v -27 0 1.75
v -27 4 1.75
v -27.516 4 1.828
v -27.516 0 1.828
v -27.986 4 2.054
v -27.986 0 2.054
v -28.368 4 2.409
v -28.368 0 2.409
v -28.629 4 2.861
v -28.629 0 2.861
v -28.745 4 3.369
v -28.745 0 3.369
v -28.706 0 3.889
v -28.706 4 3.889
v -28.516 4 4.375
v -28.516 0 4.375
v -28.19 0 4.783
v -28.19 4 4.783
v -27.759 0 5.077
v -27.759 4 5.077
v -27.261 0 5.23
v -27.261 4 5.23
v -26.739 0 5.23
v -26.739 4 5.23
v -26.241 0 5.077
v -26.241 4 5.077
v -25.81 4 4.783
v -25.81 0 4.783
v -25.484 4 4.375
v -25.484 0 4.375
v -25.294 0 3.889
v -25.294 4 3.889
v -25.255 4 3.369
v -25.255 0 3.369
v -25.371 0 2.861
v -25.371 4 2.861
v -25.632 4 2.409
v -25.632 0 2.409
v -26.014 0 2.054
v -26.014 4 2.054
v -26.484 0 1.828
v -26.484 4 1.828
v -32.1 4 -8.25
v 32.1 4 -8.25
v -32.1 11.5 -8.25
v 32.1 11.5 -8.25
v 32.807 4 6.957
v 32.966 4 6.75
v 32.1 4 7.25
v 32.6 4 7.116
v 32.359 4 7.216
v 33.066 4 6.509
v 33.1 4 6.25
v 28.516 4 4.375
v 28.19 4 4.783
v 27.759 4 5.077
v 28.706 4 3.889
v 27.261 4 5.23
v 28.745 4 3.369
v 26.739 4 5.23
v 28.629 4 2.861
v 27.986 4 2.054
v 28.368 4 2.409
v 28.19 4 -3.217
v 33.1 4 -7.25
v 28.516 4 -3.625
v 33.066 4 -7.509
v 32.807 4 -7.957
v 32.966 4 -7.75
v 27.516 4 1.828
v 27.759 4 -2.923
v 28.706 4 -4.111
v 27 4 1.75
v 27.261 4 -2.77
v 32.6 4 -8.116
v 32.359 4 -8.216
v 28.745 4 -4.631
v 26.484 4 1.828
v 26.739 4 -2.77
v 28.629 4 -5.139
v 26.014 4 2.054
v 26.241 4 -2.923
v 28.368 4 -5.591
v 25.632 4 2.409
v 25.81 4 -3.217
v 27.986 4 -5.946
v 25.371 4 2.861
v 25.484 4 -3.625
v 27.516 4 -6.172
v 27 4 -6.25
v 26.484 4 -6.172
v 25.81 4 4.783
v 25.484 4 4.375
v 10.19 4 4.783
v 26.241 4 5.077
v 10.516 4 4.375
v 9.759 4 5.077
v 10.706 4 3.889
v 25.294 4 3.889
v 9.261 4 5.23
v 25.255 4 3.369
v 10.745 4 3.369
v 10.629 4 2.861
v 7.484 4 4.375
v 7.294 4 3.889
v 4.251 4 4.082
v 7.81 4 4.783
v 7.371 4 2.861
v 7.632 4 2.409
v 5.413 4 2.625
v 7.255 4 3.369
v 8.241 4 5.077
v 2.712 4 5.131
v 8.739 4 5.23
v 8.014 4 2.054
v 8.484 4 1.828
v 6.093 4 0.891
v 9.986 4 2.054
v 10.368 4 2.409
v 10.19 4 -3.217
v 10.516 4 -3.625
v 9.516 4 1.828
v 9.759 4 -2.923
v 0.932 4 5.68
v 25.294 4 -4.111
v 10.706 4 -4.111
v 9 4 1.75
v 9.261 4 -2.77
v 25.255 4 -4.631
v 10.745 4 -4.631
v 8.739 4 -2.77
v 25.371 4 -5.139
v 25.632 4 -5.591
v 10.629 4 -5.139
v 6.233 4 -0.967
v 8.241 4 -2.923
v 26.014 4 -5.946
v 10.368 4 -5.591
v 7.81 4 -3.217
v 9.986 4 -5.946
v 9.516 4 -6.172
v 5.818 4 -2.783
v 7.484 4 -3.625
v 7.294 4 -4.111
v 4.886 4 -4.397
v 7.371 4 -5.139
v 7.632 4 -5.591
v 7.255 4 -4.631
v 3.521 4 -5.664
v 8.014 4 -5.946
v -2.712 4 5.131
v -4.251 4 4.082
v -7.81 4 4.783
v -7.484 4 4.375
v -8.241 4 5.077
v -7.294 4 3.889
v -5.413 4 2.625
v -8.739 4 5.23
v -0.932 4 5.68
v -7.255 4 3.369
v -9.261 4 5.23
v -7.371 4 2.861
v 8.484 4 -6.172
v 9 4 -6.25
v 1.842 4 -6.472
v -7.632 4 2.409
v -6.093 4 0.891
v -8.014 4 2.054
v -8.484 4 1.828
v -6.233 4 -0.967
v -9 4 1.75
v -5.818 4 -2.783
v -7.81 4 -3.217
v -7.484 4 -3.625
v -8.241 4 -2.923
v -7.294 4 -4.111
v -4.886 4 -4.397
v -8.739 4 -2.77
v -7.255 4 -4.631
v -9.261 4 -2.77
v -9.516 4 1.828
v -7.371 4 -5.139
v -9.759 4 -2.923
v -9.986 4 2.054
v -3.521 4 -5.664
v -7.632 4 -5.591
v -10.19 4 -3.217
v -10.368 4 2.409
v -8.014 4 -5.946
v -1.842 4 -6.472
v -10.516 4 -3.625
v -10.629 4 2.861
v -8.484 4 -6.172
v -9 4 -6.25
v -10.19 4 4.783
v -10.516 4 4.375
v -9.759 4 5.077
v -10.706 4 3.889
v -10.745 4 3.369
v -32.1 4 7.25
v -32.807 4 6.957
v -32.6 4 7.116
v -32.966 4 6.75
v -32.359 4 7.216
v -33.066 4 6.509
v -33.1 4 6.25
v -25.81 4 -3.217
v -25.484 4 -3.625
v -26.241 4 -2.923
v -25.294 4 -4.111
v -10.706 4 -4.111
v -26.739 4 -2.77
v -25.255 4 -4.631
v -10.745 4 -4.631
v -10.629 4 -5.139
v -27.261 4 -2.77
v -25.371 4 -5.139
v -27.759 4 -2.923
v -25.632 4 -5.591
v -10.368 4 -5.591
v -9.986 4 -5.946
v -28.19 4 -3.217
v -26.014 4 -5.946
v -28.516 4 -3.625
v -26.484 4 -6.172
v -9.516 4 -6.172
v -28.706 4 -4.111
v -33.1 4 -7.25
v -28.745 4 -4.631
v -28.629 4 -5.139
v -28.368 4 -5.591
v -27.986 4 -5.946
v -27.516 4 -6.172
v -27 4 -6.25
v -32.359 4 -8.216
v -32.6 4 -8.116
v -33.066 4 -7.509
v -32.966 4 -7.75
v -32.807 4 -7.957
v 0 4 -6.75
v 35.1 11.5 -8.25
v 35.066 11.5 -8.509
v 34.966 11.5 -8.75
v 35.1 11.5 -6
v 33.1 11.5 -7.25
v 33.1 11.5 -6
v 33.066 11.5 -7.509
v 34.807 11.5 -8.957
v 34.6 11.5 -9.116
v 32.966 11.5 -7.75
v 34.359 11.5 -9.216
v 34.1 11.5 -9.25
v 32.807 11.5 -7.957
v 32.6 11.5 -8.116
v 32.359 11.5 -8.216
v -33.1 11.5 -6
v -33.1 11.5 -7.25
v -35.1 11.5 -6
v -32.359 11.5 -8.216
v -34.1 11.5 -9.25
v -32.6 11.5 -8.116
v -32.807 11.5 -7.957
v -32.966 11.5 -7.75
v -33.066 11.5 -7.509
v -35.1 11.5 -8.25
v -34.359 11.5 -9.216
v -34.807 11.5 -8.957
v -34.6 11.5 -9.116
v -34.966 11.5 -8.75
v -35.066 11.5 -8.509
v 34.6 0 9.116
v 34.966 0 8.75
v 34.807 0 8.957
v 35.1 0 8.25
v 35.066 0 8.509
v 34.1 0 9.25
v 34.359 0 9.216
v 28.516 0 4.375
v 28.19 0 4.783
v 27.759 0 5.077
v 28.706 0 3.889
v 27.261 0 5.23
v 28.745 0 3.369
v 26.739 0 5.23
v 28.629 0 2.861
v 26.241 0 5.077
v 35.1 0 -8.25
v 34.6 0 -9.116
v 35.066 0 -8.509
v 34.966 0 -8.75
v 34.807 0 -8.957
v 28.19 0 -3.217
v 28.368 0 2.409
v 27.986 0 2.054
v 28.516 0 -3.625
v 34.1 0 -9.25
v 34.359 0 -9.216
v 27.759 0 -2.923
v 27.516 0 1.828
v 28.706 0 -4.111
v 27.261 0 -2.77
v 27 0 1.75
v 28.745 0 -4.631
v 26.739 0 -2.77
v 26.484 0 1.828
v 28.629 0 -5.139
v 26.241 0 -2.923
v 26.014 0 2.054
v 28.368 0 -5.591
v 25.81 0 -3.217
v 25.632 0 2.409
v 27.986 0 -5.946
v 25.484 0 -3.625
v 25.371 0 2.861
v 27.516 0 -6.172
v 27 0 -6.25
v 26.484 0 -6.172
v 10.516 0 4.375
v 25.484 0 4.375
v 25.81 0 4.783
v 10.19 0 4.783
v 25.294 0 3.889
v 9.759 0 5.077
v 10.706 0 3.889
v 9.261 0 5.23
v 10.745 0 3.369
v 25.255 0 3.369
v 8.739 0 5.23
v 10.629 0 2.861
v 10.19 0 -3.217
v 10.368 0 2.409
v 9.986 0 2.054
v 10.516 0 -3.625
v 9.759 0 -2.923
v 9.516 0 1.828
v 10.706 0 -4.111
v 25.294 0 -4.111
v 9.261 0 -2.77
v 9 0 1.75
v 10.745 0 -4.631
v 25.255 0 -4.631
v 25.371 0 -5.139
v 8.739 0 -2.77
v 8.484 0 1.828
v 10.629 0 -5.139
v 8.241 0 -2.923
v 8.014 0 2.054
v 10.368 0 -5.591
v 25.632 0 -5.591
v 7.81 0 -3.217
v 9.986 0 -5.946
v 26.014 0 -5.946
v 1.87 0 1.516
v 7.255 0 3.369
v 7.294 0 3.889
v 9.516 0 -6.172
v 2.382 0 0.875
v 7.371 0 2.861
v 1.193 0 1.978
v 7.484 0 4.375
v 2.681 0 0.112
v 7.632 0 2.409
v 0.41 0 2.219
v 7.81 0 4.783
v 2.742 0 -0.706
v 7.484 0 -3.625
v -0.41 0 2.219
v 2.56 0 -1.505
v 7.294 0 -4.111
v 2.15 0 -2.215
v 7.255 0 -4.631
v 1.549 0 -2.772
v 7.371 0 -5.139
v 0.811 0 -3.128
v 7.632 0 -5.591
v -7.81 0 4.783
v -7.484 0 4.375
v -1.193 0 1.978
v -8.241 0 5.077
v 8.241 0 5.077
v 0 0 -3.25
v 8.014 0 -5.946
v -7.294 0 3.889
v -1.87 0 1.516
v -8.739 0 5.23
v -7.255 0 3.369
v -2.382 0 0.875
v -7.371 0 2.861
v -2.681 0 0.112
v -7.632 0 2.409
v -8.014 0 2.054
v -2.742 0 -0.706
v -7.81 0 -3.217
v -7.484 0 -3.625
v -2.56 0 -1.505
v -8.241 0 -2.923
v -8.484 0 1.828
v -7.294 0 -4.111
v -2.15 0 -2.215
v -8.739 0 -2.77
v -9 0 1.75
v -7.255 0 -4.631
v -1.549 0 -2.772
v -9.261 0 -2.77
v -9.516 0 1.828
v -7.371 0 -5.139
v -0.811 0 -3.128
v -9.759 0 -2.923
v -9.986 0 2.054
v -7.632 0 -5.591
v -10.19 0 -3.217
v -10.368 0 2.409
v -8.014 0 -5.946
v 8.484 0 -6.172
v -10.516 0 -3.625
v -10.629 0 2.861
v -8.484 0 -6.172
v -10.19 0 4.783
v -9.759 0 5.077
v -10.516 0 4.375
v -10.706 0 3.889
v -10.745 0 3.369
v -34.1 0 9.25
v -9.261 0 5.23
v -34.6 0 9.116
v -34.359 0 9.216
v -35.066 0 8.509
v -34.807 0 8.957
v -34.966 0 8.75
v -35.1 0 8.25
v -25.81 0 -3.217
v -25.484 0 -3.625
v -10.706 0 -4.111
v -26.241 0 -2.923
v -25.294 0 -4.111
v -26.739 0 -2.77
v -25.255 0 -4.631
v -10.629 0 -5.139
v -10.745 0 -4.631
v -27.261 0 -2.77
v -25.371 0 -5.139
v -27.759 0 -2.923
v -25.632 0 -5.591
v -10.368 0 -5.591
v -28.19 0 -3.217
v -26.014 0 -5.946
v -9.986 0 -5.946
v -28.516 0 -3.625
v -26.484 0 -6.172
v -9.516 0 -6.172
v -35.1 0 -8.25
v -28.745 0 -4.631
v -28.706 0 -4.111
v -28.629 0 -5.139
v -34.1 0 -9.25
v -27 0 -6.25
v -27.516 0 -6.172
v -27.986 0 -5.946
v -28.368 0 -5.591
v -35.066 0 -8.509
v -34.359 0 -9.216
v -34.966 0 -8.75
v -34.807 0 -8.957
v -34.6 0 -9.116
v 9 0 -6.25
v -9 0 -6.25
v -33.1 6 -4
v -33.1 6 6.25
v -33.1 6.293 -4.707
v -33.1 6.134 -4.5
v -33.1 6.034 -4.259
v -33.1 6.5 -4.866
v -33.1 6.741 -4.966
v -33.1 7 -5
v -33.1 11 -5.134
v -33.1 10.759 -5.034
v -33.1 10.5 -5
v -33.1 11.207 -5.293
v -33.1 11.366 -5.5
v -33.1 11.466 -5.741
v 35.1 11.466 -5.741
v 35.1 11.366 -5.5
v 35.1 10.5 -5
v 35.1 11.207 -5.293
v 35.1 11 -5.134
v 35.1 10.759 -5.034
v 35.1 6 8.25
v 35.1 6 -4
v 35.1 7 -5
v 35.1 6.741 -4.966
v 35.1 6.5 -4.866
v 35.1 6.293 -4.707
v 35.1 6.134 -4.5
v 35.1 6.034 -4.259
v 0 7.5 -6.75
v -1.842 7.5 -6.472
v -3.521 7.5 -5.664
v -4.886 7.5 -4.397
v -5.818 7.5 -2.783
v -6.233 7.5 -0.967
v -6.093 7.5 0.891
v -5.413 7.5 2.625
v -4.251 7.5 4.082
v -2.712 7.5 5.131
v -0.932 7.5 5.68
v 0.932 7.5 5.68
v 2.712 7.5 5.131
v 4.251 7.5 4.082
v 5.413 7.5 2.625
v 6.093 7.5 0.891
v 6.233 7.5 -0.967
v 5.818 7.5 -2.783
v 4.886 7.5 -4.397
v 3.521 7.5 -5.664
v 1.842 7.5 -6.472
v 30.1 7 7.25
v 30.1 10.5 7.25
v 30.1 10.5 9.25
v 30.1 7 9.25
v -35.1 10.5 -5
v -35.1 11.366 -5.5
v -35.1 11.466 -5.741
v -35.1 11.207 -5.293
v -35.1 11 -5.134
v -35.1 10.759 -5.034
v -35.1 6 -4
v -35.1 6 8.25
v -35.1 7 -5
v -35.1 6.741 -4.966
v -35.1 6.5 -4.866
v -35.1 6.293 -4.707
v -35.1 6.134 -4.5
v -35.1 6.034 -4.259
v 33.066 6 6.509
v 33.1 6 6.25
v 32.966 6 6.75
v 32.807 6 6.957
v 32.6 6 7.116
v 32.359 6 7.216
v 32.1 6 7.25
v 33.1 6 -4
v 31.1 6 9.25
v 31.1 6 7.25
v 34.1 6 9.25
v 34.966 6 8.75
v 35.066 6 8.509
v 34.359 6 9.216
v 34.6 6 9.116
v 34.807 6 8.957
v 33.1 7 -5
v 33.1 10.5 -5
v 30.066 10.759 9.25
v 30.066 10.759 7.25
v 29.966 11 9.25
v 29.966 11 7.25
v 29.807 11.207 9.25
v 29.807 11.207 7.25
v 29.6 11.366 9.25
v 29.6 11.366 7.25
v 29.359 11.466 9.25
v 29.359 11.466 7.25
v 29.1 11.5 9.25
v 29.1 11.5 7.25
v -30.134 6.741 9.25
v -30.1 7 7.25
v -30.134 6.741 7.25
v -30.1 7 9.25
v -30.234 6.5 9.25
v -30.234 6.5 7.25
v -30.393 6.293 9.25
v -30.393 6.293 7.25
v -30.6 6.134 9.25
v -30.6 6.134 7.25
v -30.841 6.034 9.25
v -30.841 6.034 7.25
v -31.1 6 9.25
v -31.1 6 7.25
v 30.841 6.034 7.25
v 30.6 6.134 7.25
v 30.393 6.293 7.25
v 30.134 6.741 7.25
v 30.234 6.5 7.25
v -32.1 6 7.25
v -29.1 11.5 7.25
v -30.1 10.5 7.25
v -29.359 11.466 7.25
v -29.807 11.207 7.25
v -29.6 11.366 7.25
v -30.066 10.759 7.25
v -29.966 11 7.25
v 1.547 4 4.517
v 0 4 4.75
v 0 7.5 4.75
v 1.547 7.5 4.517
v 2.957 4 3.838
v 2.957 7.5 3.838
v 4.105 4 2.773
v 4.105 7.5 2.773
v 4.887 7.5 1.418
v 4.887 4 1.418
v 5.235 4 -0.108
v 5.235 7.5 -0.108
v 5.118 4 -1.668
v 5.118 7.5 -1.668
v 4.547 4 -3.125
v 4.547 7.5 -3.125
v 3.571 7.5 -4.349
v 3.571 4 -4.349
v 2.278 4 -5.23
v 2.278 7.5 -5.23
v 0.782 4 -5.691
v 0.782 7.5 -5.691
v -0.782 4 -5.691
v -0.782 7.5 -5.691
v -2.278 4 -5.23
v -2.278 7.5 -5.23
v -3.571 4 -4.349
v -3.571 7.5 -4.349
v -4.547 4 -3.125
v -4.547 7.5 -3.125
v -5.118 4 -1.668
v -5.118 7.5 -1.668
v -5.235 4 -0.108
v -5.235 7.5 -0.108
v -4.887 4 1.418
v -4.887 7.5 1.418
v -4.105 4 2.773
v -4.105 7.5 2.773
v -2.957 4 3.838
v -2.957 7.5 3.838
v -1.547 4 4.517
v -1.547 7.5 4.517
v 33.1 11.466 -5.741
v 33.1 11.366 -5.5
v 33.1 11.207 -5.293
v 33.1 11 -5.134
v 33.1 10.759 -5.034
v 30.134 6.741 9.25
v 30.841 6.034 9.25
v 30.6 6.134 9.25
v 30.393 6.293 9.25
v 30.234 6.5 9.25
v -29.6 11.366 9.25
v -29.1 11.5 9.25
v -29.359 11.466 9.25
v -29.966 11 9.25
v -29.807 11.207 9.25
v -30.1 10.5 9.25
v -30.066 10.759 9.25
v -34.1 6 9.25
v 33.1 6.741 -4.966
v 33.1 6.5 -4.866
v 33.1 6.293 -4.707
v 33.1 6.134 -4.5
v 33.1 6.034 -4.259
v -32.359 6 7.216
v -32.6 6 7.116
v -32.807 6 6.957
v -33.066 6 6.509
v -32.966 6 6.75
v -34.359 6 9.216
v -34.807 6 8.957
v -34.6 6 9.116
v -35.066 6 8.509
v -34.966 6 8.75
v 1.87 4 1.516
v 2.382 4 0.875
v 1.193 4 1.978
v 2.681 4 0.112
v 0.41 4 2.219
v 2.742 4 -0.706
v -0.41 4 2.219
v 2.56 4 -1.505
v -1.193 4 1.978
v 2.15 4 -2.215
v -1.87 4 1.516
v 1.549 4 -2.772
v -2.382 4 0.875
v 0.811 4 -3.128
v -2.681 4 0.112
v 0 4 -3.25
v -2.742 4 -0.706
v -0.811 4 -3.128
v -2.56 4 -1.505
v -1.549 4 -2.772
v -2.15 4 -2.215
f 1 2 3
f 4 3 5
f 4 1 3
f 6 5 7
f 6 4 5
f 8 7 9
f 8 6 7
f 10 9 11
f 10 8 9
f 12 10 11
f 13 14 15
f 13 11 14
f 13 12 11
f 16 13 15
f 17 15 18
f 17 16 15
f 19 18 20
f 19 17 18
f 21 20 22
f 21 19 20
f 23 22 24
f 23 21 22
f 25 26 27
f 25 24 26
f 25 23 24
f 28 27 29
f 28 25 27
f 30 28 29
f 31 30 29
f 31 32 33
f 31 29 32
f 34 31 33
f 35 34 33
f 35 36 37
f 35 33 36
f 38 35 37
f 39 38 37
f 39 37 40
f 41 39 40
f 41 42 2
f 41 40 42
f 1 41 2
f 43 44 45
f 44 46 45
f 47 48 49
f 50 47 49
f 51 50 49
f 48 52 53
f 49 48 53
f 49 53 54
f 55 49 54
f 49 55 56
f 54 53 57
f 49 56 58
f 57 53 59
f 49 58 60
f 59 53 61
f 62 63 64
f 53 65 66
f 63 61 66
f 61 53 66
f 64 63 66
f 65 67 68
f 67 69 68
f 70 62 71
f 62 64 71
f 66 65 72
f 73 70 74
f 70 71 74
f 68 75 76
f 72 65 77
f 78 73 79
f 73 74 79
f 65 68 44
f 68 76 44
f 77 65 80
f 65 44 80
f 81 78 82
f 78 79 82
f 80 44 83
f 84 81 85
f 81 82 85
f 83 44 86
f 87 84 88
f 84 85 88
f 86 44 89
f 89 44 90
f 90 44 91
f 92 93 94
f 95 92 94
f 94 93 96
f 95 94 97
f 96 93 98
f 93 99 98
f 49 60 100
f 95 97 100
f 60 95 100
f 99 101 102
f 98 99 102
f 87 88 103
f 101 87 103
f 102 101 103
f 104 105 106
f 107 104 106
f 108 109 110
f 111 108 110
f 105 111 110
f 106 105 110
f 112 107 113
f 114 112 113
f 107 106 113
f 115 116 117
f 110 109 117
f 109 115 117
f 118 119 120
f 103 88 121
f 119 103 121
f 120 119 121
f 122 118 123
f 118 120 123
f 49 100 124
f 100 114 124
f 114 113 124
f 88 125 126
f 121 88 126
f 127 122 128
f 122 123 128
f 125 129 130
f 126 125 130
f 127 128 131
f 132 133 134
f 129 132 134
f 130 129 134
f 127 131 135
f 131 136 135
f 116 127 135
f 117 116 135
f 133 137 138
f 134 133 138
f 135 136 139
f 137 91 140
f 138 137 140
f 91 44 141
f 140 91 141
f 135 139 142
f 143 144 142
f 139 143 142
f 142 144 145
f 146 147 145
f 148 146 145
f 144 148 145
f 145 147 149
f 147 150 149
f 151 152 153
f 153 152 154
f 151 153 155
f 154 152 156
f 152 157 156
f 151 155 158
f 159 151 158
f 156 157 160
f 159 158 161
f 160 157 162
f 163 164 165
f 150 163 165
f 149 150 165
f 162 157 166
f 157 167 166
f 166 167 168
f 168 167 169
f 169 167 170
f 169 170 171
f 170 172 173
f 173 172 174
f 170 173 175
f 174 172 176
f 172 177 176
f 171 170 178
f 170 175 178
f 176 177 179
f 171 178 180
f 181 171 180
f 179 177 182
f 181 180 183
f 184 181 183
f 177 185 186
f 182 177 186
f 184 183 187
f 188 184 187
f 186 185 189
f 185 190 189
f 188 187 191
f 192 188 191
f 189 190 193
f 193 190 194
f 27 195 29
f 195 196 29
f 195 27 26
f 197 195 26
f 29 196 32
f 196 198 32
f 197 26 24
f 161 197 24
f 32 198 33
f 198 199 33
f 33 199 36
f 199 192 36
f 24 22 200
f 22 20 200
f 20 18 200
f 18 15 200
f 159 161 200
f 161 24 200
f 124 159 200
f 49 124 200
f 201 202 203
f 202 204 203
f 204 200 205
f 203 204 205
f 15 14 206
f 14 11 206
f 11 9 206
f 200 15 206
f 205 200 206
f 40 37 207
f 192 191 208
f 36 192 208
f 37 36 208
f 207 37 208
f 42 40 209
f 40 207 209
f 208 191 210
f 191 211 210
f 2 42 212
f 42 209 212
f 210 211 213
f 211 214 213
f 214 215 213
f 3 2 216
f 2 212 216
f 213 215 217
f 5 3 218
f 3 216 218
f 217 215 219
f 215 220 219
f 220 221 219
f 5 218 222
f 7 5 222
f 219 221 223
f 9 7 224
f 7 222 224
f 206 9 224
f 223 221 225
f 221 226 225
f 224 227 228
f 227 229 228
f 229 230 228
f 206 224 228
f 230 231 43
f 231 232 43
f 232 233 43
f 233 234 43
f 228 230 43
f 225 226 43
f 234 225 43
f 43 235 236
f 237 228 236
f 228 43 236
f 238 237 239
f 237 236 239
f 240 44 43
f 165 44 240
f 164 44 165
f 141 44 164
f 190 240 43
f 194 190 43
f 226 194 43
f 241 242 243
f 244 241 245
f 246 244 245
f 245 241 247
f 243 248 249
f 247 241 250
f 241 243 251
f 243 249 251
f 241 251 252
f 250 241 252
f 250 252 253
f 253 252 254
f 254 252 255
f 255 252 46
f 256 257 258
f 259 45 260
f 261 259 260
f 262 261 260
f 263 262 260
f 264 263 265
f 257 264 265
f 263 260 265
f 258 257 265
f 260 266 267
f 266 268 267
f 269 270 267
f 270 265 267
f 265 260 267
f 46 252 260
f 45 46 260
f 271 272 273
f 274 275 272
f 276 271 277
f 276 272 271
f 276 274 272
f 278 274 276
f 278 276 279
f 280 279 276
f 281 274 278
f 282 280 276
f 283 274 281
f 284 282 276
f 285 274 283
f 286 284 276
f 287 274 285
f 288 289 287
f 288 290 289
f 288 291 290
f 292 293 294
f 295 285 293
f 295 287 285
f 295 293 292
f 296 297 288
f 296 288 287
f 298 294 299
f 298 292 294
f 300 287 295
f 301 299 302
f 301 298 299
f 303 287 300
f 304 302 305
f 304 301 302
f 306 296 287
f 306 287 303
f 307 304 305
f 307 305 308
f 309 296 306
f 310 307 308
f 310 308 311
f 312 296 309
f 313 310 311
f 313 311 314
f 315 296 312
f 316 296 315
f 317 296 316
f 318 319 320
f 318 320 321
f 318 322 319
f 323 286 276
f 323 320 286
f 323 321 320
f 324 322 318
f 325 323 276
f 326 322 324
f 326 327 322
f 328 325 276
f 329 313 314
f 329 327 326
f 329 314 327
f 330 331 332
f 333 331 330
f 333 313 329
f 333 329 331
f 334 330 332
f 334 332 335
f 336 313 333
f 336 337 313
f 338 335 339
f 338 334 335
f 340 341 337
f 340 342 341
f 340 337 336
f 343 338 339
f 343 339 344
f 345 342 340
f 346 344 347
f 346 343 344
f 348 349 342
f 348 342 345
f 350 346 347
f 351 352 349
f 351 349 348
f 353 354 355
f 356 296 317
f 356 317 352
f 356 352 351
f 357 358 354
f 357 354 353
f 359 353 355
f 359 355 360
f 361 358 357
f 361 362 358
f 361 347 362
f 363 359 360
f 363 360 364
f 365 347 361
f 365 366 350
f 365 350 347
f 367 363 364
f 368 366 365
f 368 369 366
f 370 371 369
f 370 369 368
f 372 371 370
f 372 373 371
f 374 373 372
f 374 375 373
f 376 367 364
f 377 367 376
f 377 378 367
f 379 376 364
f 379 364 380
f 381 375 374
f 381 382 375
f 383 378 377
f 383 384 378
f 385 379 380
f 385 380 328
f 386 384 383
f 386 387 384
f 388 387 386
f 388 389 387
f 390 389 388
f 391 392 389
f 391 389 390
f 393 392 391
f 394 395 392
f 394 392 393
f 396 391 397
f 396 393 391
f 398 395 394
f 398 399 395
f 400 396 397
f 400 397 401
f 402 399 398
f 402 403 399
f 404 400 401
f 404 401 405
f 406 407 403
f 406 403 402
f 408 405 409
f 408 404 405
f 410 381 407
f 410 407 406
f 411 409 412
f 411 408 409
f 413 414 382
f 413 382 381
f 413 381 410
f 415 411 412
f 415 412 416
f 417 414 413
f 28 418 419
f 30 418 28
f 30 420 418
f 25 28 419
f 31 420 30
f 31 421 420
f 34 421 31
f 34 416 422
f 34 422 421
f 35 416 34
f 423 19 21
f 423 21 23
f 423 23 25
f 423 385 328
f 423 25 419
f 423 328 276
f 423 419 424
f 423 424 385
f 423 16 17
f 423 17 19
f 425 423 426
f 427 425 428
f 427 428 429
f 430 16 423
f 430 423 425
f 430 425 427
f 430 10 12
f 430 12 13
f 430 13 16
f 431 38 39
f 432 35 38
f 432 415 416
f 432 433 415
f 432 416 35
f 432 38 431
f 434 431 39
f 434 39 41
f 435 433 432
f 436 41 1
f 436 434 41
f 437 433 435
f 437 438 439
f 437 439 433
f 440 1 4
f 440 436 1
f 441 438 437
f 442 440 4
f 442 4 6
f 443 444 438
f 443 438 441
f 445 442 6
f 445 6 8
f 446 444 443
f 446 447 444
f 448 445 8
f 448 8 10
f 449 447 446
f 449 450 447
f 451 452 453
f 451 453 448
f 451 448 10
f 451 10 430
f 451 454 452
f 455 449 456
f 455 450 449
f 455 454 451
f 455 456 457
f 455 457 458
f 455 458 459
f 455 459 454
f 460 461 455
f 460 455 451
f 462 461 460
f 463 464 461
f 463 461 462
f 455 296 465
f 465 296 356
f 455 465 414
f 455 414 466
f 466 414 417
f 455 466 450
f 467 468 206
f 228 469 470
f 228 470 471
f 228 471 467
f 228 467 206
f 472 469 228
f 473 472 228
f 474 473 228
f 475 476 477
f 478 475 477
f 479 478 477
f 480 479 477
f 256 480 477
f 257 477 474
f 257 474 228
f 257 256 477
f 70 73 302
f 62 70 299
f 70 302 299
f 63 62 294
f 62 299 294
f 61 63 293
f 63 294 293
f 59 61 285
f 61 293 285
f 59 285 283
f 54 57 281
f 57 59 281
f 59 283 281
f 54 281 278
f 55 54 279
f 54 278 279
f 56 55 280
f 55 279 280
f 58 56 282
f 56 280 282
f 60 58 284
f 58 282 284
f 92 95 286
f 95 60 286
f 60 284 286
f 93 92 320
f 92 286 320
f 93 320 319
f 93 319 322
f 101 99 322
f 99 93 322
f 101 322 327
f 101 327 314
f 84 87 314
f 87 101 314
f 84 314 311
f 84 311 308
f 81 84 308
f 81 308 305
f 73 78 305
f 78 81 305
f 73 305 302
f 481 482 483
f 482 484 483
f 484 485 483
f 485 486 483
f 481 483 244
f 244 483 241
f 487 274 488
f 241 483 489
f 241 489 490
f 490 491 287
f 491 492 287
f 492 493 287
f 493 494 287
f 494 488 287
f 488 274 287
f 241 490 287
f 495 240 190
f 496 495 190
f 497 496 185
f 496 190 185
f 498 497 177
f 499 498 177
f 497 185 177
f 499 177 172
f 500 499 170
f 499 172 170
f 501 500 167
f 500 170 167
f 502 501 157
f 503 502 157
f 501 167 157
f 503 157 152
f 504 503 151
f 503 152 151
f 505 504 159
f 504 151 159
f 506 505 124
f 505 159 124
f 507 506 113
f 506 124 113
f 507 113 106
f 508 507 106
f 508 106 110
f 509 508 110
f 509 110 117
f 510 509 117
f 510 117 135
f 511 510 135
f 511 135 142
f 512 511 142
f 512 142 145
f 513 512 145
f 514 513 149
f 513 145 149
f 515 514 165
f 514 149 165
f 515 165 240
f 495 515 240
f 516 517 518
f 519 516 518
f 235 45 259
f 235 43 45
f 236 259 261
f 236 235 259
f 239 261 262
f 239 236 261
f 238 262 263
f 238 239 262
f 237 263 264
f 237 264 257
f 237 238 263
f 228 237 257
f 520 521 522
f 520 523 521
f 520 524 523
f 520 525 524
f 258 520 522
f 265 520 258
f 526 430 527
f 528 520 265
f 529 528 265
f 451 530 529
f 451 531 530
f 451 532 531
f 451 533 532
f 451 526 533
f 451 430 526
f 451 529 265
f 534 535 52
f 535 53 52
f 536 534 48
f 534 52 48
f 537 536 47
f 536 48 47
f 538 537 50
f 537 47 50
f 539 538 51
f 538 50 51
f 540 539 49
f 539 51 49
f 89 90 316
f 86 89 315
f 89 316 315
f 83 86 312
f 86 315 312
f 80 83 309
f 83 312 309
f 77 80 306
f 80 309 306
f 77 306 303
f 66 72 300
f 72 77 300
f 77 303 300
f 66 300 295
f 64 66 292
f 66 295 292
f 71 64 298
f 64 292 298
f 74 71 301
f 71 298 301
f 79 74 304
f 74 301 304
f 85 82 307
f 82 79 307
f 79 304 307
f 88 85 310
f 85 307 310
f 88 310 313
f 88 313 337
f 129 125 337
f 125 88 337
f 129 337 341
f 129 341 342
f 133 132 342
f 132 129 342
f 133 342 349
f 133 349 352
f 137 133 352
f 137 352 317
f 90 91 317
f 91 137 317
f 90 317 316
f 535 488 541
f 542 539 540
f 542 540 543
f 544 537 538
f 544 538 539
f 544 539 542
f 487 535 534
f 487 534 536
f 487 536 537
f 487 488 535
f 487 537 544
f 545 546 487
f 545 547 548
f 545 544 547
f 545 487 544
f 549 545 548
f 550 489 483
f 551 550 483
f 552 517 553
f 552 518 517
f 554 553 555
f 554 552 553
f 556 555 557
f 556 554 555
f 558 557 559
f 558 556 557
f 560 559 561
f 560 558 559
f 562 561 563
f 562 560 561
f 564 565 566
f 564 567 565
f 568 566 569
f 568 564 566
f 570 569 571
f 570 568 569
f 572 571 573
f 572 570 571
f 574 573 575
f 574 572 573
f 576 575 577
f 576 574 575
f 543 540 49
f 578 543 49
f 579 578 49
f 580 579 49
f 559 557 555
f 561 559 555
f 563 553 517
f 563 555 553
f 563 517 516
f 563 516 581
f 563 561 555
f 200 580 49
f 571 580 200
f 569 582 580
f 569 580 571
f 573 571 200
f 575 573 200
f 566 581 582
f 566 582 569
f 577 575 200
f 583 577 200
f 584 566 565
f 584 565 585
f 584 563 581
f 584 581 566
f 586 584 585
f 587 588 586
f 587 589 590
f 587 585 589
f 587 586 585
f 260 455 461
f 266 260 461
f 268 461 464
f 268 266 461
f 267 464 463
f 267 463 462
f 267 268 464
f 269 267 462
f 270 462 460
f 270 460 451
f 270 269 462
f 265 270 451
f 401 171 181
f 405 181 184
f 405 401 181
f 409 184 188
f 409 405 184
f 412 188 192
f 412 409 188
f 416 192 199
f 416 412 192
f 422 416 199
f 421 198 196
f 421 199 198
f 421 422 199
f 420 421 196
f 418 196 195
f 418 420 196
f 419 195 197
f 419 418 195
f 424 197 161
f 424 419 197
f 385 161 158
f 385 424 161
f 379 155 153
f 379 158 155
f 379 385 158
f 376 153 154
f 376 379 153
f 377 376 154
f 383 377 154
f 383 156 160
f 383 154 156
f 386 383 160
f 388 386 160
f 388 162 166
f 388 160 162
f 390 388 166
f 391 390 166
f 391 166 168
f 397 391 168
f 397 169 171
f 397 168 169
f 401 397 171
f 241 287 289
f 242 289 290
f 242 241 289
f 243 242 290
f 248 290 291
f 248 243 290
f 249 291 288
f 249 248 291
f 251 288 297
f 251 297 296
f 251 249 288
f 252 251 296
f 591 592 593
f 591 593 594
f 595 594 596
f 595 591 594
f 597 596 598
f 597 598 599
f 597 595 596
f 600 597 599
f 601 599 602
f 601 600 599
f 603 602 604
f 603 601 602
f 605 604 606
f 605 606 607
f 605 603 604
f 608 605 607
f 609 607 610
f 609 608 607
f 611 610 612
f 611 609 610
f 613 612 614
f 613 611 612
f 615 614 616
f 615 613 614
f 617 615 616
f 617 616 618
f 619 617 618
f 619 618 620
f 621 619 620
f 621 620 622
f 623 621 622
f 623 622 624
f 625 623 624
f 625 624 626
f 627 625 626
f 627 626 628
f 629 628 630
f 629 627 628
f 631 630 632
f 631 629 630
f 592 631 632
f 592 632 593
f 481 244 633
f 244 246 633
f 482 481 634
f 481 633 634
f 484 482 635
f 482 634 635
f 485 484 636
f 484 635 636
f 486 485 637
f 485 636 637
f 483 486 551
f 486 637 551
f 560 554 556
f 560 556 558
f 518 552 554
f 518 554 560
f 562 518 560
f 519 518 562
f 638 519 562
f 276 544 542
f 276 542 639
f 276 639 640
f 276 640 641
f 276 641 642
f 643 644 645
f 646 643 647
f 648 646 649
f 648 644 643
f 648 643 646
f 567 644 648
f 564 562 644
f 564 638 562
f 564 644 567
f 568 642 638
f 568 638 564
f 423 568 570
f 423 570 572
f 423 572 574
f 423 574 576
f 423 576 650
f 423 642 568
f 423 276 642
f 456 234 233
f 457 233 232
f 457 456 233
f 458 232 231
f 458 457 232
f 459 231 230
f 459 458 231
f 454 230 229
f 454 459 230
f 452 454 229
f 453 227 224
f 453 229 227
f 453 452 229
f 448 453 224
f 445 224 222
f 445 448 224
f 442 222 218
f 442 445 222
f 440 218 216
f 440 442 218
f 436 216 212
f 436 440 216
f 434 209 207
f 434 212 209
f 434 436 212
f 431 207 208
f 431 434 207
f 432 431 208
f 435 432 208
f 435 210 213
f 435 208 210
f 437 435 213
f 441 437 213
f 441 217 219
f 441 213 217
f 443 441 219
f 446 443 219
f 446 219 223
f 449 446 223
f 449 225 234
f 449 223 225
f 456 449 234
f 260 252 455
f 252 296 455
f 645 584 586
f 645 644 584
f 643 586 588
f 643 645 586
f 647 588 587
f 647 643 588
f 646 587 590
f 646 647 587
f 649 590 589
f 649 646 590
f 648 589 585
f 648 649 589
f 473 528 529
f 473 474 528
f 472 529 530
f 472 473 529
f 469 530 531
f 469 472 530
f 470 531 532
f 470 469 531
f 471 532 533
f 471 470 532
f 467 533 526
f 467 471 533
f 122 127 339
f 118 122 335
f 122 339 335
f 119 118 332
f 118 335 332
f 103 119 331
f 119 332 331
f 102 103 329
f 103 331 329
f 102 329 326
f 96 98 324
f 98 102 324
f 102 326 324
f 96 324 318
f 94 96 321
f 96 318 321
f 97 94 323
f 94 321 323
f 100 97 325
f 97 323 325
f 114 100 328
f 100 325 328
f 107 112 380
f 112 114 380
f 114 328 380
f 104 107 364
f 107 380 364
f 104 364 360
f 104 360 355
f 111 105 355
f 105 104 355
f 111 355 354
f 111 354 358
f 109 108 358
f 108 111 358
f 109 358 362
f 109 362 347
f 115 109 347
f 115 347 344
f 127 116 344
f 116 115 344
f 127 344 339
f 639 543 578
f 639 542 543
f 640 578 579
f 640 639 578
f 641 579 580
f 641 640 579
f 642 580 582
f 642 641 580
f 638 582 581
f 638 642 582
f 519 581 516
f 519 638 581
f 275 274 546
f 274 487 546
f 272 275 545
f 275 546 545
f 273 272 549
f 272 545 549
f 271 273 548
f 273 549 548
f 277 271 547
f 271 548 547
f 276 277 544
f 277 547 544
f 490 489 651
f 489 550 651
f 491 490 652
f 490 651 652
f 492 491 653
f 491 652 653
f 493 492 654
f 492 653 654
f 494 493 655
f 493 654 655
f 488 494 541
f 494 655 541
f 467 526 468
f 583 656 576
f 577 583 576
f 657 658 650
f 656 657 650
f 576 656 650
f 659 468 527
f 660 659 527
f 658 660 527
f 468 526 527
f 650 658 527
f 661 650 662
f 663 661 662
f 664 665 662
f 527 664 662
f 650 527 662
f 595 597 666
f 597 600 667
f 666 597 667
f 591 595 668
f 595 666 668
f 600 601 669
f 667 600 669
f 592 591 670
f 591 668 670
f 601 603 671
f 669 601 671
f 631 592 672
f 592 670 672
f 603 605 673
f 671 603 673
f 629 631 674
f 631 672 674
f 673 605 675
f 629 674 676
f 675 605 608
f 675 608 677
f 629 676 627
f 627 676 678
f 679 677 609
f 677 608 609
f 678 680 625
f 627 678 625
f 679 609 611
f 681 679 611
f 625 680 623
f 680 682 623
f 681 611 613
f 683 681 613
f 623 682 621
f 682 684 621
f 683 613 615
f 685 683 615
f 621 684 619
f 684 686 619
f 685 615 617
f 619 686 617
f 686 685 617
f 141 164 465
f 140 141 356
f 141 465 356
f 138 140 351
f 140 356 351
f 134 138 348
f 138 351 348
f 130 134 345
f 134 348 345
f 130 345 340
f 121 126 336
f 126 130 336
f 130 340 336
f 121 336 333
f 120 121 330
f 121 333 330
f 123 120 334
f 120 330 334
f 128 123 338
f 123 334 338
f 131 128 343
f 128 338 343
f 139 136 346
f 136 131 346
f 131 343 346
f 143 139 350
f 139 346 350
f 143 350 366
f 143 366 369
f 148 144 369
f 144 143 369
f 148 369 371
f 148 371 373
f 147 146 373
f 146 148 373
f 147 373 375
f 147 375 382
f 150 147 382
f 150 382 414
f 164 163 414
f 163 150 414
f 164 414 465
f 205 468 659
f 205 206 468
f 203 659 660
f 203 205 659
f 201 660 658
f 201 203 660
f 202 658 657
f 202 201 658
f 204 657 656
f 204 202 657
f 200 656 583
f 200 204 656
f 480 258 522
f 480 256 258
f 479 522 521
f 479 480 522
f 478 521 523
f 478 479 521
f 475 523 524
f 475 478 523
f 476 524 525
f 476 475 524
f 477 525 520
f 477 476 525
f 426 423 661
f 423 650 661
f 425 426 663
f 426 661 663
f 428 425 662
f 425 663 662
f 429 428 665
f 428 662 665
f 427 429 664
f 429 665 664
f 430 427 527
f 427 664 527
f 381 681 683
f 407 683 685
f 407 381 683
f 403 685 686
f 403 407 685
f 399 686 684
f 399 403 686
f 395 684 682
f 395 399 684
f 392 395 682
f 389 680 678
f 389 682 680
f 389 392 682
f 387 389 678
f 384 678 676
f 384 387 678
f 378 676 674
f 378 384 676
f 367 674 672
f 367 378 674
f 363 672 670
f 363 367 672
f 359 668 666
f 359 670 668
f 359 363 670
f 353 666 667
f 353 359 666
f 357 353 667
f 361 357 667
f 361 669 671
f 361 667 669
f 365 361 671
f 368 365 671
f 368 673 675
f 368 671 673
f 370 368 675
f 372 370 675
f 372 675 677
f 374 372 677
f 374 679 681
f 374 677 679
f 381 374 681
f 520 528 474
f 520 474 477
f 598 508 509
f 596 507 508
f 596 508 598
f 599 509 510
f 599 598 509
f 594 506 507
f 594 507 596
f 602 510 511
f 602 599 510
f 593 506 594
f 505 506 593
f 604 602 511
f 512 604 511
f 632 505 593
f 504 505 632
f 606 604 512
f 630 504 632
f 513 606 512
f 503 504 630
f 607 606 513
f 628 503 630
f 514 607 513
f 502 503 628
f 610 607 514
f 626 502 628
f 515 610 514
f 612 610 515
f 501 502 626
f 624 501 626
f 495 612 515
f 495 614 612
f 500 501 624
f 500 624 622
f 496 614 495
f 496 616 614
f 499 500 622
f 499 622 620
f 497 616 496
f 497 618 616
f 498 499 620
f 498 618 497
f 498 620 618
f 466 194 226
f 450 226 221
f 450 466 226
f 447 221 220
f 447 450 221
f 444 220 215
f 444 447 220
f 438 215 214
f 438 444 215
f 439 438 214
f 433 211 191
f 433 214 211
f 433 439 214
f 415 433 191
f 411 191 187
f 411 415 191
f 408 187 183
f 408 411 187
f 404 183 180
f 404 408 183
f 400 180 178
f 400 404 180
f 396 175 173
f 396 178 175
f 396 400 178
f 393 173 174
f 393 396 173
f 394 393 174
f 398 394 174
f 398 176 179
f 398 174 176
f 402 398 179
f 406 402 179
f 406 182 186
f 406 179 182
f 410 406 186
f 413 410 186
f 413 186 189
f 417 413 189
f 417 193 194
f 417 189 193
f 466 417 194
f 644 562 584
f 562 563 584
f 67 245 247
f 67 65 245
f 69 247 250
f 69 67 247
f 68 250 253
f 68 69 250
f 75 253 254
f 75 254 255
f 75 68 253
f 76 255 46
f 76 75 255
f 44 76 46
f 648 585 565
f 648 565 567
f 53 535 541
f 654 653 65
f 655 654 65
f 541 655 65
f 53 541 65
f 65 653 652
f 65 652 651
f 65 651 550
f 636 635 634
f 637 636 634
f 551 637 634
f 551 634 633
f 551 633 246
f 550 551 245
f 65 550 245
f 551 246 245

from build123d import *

# Parameters (mm, degrees)
SKETCH1_W           = 35.1
SKETCH1_H           = 18.5
BOSS_EXTRUDE1_DEPTH = 11.5
SKETCH7_W           = 33.1
SKETCH7_H           = 15.5
CUT_EXTRUDE5_DEPTH  = 7.5
SKETCH2_R           = 1.75
CUT_EXTRUDE1_DEPTH  = 39.076534769
SKETCH4_W           = 14.25
SKETCH4_H           = 5.5
CUT_EXTRUDE3_DEPTH  = 5
SKETCH5_R           = 2.75
CUT_EXTRUDE4_DEPTH  = 39.076534769
SKETCH6_R           = 6.25
SKETCH6_R_2         = 5.25
BOSS_EXTRUDE2_DEPTH = 3.5
FILLET3_R           = 1
FILLET6_R           = 1


with BuildPart() as part:
    # Sketch1 → Boss-Extrude1 (new body)
    with BuildSketch(Plane(origin=(0, 0, 0), x_dir=(1, 0, 0), z_dir=(0, 1, 0))):
        with Locations((-17.55, 0)):
            Rectangle(SKETCH1_W, SKETCH1_H)
    extrude(amount=BOSS_EXTRUDE1_DEPTH)

    # Sketch7 → Cut-Extrude5 (cut)
    with BuildSketch(Plane(origin=(0, 11.5, 0), x_dir=(1, 0, 0), z_dir=(0, 1, 0))):
        with Locations((-16.55, 0.5)):
            Rectangle(SKETCH7_W, SKETCH7_H)
    extrude(amount=-CUT_EXTRUDE5_DEPTH, mode=Mode.SUBTRACT)

    # Sketch2 → Cut-Extrude1 (cut, through all)
    with BuildSketch(Plane(origin=(0, 0, 0), x_dir=(-1, 0, 0), z_dir=(0, 1, 0))):
        with Locations(Location((27, 3.5, 0), (0, 0, 270))):
            Circle(SKETCH2_R)
        with Locations(Location((9, 3.5, 0), (0, 0, 270))):
            Circle(SKETCH2_R)
        with Locations(Location((27, -4.5, 0), (0, 0, 270))):
            Circle(SKETCH2_R)
        with Locations(Location((9, -4.5, 0), (0, 0, 270))):
            Circle(SKETCH2_R)
    extrude(amount=CUT_EXTRUDE1_DEPTH, mode=Mode.SUBTRACT)

    # Sketch4 → Cut-Extrude3 (cut)
    with BuildSketch(Plane.ZY.offset(35.1)):
        with Locations((2.125, 8.75)):
            Rectangle(SKETCH4_W, SKETCH4_H)
    extrude(amount=-CUT_EXTRUDE3_DEPTH, mode=Mode.SUBTRACT)

    # Mirror1: part across plane


with BuildPart() as part_1:
    add(part.part)
    add(part.part.mirror(Plane(origin=(0, 0, 0), x_dir=(0, 0, 1), z_dir=(1, 0, 0))))

    # Sketch5 → Cut-Extrude4 (cut, through all)
    with BuildSketch(Plane(origin=(0, 0, 0), x_dir=(1, 0, 0), z_dir=(0, 1, 0))):
        with Locations(Location((0, 0.5, 0), (0, 0, 90))):
            Circle(SKETCH5_R)
    extrude(amount=CUT_EXTRUDE4_DEPTH, mode=Mode.SUBTRACT)

    # Sketch6 → Boss-Extrude2 (add)
    with BuildSketch(Plane(origin=(0, 4, 0), x_dir=(1, 0, 0), z_dir=(0, 1, 0))):
        with Locations(Location((0, 0.5, 0), (0, 0, 90))):
            Circle(SKETCH6_R)
        with Locations(Location((0, 0.5, 0), (0, 0, 270))):
            Circle(SKETCH6_R_2, mode=Mode.SUBTRACT)
    extrude(amount=BOSS_EXTRUDE2_DEPTH)

    # Fillet3
    fillet3_edges = [part_1.edges().sort_by_distance(p)[0] for p in [
        (-34.1, 6, -5),
        (-34.1, 11.5, -5),
        (-30.1, 11.5, 8.25),
        (-30.1, 6, 8.25),
        (34.1, 11.5, -5),
        (34.1, 6, -5),
        (30.1, 11.5, 8.25),
        (30.1, 6, 8.25),
    ]]
    fillet(fillet3_edges, radius=FILLET3_R)

    # Fillet6
    fillet6_edges = [part_1.edges().sort_by_distance(p)[0] for p in [
        (-33.1, 7.75, -8.25),
        (-33.1, 5, 7.25),
        (-35.1, 3, 9.25),
        (35.1, 5.75, -9.25),
        (35.1, 3, 9.25),
        (33.1, 7.75, -8.25),
        (33.1, 5, 7.25),
        (-35.1, 5.75, -9.25),
    ]]
    fillet(fillet6_edges, radius=FILLET6_R)


solid = part_1.part
